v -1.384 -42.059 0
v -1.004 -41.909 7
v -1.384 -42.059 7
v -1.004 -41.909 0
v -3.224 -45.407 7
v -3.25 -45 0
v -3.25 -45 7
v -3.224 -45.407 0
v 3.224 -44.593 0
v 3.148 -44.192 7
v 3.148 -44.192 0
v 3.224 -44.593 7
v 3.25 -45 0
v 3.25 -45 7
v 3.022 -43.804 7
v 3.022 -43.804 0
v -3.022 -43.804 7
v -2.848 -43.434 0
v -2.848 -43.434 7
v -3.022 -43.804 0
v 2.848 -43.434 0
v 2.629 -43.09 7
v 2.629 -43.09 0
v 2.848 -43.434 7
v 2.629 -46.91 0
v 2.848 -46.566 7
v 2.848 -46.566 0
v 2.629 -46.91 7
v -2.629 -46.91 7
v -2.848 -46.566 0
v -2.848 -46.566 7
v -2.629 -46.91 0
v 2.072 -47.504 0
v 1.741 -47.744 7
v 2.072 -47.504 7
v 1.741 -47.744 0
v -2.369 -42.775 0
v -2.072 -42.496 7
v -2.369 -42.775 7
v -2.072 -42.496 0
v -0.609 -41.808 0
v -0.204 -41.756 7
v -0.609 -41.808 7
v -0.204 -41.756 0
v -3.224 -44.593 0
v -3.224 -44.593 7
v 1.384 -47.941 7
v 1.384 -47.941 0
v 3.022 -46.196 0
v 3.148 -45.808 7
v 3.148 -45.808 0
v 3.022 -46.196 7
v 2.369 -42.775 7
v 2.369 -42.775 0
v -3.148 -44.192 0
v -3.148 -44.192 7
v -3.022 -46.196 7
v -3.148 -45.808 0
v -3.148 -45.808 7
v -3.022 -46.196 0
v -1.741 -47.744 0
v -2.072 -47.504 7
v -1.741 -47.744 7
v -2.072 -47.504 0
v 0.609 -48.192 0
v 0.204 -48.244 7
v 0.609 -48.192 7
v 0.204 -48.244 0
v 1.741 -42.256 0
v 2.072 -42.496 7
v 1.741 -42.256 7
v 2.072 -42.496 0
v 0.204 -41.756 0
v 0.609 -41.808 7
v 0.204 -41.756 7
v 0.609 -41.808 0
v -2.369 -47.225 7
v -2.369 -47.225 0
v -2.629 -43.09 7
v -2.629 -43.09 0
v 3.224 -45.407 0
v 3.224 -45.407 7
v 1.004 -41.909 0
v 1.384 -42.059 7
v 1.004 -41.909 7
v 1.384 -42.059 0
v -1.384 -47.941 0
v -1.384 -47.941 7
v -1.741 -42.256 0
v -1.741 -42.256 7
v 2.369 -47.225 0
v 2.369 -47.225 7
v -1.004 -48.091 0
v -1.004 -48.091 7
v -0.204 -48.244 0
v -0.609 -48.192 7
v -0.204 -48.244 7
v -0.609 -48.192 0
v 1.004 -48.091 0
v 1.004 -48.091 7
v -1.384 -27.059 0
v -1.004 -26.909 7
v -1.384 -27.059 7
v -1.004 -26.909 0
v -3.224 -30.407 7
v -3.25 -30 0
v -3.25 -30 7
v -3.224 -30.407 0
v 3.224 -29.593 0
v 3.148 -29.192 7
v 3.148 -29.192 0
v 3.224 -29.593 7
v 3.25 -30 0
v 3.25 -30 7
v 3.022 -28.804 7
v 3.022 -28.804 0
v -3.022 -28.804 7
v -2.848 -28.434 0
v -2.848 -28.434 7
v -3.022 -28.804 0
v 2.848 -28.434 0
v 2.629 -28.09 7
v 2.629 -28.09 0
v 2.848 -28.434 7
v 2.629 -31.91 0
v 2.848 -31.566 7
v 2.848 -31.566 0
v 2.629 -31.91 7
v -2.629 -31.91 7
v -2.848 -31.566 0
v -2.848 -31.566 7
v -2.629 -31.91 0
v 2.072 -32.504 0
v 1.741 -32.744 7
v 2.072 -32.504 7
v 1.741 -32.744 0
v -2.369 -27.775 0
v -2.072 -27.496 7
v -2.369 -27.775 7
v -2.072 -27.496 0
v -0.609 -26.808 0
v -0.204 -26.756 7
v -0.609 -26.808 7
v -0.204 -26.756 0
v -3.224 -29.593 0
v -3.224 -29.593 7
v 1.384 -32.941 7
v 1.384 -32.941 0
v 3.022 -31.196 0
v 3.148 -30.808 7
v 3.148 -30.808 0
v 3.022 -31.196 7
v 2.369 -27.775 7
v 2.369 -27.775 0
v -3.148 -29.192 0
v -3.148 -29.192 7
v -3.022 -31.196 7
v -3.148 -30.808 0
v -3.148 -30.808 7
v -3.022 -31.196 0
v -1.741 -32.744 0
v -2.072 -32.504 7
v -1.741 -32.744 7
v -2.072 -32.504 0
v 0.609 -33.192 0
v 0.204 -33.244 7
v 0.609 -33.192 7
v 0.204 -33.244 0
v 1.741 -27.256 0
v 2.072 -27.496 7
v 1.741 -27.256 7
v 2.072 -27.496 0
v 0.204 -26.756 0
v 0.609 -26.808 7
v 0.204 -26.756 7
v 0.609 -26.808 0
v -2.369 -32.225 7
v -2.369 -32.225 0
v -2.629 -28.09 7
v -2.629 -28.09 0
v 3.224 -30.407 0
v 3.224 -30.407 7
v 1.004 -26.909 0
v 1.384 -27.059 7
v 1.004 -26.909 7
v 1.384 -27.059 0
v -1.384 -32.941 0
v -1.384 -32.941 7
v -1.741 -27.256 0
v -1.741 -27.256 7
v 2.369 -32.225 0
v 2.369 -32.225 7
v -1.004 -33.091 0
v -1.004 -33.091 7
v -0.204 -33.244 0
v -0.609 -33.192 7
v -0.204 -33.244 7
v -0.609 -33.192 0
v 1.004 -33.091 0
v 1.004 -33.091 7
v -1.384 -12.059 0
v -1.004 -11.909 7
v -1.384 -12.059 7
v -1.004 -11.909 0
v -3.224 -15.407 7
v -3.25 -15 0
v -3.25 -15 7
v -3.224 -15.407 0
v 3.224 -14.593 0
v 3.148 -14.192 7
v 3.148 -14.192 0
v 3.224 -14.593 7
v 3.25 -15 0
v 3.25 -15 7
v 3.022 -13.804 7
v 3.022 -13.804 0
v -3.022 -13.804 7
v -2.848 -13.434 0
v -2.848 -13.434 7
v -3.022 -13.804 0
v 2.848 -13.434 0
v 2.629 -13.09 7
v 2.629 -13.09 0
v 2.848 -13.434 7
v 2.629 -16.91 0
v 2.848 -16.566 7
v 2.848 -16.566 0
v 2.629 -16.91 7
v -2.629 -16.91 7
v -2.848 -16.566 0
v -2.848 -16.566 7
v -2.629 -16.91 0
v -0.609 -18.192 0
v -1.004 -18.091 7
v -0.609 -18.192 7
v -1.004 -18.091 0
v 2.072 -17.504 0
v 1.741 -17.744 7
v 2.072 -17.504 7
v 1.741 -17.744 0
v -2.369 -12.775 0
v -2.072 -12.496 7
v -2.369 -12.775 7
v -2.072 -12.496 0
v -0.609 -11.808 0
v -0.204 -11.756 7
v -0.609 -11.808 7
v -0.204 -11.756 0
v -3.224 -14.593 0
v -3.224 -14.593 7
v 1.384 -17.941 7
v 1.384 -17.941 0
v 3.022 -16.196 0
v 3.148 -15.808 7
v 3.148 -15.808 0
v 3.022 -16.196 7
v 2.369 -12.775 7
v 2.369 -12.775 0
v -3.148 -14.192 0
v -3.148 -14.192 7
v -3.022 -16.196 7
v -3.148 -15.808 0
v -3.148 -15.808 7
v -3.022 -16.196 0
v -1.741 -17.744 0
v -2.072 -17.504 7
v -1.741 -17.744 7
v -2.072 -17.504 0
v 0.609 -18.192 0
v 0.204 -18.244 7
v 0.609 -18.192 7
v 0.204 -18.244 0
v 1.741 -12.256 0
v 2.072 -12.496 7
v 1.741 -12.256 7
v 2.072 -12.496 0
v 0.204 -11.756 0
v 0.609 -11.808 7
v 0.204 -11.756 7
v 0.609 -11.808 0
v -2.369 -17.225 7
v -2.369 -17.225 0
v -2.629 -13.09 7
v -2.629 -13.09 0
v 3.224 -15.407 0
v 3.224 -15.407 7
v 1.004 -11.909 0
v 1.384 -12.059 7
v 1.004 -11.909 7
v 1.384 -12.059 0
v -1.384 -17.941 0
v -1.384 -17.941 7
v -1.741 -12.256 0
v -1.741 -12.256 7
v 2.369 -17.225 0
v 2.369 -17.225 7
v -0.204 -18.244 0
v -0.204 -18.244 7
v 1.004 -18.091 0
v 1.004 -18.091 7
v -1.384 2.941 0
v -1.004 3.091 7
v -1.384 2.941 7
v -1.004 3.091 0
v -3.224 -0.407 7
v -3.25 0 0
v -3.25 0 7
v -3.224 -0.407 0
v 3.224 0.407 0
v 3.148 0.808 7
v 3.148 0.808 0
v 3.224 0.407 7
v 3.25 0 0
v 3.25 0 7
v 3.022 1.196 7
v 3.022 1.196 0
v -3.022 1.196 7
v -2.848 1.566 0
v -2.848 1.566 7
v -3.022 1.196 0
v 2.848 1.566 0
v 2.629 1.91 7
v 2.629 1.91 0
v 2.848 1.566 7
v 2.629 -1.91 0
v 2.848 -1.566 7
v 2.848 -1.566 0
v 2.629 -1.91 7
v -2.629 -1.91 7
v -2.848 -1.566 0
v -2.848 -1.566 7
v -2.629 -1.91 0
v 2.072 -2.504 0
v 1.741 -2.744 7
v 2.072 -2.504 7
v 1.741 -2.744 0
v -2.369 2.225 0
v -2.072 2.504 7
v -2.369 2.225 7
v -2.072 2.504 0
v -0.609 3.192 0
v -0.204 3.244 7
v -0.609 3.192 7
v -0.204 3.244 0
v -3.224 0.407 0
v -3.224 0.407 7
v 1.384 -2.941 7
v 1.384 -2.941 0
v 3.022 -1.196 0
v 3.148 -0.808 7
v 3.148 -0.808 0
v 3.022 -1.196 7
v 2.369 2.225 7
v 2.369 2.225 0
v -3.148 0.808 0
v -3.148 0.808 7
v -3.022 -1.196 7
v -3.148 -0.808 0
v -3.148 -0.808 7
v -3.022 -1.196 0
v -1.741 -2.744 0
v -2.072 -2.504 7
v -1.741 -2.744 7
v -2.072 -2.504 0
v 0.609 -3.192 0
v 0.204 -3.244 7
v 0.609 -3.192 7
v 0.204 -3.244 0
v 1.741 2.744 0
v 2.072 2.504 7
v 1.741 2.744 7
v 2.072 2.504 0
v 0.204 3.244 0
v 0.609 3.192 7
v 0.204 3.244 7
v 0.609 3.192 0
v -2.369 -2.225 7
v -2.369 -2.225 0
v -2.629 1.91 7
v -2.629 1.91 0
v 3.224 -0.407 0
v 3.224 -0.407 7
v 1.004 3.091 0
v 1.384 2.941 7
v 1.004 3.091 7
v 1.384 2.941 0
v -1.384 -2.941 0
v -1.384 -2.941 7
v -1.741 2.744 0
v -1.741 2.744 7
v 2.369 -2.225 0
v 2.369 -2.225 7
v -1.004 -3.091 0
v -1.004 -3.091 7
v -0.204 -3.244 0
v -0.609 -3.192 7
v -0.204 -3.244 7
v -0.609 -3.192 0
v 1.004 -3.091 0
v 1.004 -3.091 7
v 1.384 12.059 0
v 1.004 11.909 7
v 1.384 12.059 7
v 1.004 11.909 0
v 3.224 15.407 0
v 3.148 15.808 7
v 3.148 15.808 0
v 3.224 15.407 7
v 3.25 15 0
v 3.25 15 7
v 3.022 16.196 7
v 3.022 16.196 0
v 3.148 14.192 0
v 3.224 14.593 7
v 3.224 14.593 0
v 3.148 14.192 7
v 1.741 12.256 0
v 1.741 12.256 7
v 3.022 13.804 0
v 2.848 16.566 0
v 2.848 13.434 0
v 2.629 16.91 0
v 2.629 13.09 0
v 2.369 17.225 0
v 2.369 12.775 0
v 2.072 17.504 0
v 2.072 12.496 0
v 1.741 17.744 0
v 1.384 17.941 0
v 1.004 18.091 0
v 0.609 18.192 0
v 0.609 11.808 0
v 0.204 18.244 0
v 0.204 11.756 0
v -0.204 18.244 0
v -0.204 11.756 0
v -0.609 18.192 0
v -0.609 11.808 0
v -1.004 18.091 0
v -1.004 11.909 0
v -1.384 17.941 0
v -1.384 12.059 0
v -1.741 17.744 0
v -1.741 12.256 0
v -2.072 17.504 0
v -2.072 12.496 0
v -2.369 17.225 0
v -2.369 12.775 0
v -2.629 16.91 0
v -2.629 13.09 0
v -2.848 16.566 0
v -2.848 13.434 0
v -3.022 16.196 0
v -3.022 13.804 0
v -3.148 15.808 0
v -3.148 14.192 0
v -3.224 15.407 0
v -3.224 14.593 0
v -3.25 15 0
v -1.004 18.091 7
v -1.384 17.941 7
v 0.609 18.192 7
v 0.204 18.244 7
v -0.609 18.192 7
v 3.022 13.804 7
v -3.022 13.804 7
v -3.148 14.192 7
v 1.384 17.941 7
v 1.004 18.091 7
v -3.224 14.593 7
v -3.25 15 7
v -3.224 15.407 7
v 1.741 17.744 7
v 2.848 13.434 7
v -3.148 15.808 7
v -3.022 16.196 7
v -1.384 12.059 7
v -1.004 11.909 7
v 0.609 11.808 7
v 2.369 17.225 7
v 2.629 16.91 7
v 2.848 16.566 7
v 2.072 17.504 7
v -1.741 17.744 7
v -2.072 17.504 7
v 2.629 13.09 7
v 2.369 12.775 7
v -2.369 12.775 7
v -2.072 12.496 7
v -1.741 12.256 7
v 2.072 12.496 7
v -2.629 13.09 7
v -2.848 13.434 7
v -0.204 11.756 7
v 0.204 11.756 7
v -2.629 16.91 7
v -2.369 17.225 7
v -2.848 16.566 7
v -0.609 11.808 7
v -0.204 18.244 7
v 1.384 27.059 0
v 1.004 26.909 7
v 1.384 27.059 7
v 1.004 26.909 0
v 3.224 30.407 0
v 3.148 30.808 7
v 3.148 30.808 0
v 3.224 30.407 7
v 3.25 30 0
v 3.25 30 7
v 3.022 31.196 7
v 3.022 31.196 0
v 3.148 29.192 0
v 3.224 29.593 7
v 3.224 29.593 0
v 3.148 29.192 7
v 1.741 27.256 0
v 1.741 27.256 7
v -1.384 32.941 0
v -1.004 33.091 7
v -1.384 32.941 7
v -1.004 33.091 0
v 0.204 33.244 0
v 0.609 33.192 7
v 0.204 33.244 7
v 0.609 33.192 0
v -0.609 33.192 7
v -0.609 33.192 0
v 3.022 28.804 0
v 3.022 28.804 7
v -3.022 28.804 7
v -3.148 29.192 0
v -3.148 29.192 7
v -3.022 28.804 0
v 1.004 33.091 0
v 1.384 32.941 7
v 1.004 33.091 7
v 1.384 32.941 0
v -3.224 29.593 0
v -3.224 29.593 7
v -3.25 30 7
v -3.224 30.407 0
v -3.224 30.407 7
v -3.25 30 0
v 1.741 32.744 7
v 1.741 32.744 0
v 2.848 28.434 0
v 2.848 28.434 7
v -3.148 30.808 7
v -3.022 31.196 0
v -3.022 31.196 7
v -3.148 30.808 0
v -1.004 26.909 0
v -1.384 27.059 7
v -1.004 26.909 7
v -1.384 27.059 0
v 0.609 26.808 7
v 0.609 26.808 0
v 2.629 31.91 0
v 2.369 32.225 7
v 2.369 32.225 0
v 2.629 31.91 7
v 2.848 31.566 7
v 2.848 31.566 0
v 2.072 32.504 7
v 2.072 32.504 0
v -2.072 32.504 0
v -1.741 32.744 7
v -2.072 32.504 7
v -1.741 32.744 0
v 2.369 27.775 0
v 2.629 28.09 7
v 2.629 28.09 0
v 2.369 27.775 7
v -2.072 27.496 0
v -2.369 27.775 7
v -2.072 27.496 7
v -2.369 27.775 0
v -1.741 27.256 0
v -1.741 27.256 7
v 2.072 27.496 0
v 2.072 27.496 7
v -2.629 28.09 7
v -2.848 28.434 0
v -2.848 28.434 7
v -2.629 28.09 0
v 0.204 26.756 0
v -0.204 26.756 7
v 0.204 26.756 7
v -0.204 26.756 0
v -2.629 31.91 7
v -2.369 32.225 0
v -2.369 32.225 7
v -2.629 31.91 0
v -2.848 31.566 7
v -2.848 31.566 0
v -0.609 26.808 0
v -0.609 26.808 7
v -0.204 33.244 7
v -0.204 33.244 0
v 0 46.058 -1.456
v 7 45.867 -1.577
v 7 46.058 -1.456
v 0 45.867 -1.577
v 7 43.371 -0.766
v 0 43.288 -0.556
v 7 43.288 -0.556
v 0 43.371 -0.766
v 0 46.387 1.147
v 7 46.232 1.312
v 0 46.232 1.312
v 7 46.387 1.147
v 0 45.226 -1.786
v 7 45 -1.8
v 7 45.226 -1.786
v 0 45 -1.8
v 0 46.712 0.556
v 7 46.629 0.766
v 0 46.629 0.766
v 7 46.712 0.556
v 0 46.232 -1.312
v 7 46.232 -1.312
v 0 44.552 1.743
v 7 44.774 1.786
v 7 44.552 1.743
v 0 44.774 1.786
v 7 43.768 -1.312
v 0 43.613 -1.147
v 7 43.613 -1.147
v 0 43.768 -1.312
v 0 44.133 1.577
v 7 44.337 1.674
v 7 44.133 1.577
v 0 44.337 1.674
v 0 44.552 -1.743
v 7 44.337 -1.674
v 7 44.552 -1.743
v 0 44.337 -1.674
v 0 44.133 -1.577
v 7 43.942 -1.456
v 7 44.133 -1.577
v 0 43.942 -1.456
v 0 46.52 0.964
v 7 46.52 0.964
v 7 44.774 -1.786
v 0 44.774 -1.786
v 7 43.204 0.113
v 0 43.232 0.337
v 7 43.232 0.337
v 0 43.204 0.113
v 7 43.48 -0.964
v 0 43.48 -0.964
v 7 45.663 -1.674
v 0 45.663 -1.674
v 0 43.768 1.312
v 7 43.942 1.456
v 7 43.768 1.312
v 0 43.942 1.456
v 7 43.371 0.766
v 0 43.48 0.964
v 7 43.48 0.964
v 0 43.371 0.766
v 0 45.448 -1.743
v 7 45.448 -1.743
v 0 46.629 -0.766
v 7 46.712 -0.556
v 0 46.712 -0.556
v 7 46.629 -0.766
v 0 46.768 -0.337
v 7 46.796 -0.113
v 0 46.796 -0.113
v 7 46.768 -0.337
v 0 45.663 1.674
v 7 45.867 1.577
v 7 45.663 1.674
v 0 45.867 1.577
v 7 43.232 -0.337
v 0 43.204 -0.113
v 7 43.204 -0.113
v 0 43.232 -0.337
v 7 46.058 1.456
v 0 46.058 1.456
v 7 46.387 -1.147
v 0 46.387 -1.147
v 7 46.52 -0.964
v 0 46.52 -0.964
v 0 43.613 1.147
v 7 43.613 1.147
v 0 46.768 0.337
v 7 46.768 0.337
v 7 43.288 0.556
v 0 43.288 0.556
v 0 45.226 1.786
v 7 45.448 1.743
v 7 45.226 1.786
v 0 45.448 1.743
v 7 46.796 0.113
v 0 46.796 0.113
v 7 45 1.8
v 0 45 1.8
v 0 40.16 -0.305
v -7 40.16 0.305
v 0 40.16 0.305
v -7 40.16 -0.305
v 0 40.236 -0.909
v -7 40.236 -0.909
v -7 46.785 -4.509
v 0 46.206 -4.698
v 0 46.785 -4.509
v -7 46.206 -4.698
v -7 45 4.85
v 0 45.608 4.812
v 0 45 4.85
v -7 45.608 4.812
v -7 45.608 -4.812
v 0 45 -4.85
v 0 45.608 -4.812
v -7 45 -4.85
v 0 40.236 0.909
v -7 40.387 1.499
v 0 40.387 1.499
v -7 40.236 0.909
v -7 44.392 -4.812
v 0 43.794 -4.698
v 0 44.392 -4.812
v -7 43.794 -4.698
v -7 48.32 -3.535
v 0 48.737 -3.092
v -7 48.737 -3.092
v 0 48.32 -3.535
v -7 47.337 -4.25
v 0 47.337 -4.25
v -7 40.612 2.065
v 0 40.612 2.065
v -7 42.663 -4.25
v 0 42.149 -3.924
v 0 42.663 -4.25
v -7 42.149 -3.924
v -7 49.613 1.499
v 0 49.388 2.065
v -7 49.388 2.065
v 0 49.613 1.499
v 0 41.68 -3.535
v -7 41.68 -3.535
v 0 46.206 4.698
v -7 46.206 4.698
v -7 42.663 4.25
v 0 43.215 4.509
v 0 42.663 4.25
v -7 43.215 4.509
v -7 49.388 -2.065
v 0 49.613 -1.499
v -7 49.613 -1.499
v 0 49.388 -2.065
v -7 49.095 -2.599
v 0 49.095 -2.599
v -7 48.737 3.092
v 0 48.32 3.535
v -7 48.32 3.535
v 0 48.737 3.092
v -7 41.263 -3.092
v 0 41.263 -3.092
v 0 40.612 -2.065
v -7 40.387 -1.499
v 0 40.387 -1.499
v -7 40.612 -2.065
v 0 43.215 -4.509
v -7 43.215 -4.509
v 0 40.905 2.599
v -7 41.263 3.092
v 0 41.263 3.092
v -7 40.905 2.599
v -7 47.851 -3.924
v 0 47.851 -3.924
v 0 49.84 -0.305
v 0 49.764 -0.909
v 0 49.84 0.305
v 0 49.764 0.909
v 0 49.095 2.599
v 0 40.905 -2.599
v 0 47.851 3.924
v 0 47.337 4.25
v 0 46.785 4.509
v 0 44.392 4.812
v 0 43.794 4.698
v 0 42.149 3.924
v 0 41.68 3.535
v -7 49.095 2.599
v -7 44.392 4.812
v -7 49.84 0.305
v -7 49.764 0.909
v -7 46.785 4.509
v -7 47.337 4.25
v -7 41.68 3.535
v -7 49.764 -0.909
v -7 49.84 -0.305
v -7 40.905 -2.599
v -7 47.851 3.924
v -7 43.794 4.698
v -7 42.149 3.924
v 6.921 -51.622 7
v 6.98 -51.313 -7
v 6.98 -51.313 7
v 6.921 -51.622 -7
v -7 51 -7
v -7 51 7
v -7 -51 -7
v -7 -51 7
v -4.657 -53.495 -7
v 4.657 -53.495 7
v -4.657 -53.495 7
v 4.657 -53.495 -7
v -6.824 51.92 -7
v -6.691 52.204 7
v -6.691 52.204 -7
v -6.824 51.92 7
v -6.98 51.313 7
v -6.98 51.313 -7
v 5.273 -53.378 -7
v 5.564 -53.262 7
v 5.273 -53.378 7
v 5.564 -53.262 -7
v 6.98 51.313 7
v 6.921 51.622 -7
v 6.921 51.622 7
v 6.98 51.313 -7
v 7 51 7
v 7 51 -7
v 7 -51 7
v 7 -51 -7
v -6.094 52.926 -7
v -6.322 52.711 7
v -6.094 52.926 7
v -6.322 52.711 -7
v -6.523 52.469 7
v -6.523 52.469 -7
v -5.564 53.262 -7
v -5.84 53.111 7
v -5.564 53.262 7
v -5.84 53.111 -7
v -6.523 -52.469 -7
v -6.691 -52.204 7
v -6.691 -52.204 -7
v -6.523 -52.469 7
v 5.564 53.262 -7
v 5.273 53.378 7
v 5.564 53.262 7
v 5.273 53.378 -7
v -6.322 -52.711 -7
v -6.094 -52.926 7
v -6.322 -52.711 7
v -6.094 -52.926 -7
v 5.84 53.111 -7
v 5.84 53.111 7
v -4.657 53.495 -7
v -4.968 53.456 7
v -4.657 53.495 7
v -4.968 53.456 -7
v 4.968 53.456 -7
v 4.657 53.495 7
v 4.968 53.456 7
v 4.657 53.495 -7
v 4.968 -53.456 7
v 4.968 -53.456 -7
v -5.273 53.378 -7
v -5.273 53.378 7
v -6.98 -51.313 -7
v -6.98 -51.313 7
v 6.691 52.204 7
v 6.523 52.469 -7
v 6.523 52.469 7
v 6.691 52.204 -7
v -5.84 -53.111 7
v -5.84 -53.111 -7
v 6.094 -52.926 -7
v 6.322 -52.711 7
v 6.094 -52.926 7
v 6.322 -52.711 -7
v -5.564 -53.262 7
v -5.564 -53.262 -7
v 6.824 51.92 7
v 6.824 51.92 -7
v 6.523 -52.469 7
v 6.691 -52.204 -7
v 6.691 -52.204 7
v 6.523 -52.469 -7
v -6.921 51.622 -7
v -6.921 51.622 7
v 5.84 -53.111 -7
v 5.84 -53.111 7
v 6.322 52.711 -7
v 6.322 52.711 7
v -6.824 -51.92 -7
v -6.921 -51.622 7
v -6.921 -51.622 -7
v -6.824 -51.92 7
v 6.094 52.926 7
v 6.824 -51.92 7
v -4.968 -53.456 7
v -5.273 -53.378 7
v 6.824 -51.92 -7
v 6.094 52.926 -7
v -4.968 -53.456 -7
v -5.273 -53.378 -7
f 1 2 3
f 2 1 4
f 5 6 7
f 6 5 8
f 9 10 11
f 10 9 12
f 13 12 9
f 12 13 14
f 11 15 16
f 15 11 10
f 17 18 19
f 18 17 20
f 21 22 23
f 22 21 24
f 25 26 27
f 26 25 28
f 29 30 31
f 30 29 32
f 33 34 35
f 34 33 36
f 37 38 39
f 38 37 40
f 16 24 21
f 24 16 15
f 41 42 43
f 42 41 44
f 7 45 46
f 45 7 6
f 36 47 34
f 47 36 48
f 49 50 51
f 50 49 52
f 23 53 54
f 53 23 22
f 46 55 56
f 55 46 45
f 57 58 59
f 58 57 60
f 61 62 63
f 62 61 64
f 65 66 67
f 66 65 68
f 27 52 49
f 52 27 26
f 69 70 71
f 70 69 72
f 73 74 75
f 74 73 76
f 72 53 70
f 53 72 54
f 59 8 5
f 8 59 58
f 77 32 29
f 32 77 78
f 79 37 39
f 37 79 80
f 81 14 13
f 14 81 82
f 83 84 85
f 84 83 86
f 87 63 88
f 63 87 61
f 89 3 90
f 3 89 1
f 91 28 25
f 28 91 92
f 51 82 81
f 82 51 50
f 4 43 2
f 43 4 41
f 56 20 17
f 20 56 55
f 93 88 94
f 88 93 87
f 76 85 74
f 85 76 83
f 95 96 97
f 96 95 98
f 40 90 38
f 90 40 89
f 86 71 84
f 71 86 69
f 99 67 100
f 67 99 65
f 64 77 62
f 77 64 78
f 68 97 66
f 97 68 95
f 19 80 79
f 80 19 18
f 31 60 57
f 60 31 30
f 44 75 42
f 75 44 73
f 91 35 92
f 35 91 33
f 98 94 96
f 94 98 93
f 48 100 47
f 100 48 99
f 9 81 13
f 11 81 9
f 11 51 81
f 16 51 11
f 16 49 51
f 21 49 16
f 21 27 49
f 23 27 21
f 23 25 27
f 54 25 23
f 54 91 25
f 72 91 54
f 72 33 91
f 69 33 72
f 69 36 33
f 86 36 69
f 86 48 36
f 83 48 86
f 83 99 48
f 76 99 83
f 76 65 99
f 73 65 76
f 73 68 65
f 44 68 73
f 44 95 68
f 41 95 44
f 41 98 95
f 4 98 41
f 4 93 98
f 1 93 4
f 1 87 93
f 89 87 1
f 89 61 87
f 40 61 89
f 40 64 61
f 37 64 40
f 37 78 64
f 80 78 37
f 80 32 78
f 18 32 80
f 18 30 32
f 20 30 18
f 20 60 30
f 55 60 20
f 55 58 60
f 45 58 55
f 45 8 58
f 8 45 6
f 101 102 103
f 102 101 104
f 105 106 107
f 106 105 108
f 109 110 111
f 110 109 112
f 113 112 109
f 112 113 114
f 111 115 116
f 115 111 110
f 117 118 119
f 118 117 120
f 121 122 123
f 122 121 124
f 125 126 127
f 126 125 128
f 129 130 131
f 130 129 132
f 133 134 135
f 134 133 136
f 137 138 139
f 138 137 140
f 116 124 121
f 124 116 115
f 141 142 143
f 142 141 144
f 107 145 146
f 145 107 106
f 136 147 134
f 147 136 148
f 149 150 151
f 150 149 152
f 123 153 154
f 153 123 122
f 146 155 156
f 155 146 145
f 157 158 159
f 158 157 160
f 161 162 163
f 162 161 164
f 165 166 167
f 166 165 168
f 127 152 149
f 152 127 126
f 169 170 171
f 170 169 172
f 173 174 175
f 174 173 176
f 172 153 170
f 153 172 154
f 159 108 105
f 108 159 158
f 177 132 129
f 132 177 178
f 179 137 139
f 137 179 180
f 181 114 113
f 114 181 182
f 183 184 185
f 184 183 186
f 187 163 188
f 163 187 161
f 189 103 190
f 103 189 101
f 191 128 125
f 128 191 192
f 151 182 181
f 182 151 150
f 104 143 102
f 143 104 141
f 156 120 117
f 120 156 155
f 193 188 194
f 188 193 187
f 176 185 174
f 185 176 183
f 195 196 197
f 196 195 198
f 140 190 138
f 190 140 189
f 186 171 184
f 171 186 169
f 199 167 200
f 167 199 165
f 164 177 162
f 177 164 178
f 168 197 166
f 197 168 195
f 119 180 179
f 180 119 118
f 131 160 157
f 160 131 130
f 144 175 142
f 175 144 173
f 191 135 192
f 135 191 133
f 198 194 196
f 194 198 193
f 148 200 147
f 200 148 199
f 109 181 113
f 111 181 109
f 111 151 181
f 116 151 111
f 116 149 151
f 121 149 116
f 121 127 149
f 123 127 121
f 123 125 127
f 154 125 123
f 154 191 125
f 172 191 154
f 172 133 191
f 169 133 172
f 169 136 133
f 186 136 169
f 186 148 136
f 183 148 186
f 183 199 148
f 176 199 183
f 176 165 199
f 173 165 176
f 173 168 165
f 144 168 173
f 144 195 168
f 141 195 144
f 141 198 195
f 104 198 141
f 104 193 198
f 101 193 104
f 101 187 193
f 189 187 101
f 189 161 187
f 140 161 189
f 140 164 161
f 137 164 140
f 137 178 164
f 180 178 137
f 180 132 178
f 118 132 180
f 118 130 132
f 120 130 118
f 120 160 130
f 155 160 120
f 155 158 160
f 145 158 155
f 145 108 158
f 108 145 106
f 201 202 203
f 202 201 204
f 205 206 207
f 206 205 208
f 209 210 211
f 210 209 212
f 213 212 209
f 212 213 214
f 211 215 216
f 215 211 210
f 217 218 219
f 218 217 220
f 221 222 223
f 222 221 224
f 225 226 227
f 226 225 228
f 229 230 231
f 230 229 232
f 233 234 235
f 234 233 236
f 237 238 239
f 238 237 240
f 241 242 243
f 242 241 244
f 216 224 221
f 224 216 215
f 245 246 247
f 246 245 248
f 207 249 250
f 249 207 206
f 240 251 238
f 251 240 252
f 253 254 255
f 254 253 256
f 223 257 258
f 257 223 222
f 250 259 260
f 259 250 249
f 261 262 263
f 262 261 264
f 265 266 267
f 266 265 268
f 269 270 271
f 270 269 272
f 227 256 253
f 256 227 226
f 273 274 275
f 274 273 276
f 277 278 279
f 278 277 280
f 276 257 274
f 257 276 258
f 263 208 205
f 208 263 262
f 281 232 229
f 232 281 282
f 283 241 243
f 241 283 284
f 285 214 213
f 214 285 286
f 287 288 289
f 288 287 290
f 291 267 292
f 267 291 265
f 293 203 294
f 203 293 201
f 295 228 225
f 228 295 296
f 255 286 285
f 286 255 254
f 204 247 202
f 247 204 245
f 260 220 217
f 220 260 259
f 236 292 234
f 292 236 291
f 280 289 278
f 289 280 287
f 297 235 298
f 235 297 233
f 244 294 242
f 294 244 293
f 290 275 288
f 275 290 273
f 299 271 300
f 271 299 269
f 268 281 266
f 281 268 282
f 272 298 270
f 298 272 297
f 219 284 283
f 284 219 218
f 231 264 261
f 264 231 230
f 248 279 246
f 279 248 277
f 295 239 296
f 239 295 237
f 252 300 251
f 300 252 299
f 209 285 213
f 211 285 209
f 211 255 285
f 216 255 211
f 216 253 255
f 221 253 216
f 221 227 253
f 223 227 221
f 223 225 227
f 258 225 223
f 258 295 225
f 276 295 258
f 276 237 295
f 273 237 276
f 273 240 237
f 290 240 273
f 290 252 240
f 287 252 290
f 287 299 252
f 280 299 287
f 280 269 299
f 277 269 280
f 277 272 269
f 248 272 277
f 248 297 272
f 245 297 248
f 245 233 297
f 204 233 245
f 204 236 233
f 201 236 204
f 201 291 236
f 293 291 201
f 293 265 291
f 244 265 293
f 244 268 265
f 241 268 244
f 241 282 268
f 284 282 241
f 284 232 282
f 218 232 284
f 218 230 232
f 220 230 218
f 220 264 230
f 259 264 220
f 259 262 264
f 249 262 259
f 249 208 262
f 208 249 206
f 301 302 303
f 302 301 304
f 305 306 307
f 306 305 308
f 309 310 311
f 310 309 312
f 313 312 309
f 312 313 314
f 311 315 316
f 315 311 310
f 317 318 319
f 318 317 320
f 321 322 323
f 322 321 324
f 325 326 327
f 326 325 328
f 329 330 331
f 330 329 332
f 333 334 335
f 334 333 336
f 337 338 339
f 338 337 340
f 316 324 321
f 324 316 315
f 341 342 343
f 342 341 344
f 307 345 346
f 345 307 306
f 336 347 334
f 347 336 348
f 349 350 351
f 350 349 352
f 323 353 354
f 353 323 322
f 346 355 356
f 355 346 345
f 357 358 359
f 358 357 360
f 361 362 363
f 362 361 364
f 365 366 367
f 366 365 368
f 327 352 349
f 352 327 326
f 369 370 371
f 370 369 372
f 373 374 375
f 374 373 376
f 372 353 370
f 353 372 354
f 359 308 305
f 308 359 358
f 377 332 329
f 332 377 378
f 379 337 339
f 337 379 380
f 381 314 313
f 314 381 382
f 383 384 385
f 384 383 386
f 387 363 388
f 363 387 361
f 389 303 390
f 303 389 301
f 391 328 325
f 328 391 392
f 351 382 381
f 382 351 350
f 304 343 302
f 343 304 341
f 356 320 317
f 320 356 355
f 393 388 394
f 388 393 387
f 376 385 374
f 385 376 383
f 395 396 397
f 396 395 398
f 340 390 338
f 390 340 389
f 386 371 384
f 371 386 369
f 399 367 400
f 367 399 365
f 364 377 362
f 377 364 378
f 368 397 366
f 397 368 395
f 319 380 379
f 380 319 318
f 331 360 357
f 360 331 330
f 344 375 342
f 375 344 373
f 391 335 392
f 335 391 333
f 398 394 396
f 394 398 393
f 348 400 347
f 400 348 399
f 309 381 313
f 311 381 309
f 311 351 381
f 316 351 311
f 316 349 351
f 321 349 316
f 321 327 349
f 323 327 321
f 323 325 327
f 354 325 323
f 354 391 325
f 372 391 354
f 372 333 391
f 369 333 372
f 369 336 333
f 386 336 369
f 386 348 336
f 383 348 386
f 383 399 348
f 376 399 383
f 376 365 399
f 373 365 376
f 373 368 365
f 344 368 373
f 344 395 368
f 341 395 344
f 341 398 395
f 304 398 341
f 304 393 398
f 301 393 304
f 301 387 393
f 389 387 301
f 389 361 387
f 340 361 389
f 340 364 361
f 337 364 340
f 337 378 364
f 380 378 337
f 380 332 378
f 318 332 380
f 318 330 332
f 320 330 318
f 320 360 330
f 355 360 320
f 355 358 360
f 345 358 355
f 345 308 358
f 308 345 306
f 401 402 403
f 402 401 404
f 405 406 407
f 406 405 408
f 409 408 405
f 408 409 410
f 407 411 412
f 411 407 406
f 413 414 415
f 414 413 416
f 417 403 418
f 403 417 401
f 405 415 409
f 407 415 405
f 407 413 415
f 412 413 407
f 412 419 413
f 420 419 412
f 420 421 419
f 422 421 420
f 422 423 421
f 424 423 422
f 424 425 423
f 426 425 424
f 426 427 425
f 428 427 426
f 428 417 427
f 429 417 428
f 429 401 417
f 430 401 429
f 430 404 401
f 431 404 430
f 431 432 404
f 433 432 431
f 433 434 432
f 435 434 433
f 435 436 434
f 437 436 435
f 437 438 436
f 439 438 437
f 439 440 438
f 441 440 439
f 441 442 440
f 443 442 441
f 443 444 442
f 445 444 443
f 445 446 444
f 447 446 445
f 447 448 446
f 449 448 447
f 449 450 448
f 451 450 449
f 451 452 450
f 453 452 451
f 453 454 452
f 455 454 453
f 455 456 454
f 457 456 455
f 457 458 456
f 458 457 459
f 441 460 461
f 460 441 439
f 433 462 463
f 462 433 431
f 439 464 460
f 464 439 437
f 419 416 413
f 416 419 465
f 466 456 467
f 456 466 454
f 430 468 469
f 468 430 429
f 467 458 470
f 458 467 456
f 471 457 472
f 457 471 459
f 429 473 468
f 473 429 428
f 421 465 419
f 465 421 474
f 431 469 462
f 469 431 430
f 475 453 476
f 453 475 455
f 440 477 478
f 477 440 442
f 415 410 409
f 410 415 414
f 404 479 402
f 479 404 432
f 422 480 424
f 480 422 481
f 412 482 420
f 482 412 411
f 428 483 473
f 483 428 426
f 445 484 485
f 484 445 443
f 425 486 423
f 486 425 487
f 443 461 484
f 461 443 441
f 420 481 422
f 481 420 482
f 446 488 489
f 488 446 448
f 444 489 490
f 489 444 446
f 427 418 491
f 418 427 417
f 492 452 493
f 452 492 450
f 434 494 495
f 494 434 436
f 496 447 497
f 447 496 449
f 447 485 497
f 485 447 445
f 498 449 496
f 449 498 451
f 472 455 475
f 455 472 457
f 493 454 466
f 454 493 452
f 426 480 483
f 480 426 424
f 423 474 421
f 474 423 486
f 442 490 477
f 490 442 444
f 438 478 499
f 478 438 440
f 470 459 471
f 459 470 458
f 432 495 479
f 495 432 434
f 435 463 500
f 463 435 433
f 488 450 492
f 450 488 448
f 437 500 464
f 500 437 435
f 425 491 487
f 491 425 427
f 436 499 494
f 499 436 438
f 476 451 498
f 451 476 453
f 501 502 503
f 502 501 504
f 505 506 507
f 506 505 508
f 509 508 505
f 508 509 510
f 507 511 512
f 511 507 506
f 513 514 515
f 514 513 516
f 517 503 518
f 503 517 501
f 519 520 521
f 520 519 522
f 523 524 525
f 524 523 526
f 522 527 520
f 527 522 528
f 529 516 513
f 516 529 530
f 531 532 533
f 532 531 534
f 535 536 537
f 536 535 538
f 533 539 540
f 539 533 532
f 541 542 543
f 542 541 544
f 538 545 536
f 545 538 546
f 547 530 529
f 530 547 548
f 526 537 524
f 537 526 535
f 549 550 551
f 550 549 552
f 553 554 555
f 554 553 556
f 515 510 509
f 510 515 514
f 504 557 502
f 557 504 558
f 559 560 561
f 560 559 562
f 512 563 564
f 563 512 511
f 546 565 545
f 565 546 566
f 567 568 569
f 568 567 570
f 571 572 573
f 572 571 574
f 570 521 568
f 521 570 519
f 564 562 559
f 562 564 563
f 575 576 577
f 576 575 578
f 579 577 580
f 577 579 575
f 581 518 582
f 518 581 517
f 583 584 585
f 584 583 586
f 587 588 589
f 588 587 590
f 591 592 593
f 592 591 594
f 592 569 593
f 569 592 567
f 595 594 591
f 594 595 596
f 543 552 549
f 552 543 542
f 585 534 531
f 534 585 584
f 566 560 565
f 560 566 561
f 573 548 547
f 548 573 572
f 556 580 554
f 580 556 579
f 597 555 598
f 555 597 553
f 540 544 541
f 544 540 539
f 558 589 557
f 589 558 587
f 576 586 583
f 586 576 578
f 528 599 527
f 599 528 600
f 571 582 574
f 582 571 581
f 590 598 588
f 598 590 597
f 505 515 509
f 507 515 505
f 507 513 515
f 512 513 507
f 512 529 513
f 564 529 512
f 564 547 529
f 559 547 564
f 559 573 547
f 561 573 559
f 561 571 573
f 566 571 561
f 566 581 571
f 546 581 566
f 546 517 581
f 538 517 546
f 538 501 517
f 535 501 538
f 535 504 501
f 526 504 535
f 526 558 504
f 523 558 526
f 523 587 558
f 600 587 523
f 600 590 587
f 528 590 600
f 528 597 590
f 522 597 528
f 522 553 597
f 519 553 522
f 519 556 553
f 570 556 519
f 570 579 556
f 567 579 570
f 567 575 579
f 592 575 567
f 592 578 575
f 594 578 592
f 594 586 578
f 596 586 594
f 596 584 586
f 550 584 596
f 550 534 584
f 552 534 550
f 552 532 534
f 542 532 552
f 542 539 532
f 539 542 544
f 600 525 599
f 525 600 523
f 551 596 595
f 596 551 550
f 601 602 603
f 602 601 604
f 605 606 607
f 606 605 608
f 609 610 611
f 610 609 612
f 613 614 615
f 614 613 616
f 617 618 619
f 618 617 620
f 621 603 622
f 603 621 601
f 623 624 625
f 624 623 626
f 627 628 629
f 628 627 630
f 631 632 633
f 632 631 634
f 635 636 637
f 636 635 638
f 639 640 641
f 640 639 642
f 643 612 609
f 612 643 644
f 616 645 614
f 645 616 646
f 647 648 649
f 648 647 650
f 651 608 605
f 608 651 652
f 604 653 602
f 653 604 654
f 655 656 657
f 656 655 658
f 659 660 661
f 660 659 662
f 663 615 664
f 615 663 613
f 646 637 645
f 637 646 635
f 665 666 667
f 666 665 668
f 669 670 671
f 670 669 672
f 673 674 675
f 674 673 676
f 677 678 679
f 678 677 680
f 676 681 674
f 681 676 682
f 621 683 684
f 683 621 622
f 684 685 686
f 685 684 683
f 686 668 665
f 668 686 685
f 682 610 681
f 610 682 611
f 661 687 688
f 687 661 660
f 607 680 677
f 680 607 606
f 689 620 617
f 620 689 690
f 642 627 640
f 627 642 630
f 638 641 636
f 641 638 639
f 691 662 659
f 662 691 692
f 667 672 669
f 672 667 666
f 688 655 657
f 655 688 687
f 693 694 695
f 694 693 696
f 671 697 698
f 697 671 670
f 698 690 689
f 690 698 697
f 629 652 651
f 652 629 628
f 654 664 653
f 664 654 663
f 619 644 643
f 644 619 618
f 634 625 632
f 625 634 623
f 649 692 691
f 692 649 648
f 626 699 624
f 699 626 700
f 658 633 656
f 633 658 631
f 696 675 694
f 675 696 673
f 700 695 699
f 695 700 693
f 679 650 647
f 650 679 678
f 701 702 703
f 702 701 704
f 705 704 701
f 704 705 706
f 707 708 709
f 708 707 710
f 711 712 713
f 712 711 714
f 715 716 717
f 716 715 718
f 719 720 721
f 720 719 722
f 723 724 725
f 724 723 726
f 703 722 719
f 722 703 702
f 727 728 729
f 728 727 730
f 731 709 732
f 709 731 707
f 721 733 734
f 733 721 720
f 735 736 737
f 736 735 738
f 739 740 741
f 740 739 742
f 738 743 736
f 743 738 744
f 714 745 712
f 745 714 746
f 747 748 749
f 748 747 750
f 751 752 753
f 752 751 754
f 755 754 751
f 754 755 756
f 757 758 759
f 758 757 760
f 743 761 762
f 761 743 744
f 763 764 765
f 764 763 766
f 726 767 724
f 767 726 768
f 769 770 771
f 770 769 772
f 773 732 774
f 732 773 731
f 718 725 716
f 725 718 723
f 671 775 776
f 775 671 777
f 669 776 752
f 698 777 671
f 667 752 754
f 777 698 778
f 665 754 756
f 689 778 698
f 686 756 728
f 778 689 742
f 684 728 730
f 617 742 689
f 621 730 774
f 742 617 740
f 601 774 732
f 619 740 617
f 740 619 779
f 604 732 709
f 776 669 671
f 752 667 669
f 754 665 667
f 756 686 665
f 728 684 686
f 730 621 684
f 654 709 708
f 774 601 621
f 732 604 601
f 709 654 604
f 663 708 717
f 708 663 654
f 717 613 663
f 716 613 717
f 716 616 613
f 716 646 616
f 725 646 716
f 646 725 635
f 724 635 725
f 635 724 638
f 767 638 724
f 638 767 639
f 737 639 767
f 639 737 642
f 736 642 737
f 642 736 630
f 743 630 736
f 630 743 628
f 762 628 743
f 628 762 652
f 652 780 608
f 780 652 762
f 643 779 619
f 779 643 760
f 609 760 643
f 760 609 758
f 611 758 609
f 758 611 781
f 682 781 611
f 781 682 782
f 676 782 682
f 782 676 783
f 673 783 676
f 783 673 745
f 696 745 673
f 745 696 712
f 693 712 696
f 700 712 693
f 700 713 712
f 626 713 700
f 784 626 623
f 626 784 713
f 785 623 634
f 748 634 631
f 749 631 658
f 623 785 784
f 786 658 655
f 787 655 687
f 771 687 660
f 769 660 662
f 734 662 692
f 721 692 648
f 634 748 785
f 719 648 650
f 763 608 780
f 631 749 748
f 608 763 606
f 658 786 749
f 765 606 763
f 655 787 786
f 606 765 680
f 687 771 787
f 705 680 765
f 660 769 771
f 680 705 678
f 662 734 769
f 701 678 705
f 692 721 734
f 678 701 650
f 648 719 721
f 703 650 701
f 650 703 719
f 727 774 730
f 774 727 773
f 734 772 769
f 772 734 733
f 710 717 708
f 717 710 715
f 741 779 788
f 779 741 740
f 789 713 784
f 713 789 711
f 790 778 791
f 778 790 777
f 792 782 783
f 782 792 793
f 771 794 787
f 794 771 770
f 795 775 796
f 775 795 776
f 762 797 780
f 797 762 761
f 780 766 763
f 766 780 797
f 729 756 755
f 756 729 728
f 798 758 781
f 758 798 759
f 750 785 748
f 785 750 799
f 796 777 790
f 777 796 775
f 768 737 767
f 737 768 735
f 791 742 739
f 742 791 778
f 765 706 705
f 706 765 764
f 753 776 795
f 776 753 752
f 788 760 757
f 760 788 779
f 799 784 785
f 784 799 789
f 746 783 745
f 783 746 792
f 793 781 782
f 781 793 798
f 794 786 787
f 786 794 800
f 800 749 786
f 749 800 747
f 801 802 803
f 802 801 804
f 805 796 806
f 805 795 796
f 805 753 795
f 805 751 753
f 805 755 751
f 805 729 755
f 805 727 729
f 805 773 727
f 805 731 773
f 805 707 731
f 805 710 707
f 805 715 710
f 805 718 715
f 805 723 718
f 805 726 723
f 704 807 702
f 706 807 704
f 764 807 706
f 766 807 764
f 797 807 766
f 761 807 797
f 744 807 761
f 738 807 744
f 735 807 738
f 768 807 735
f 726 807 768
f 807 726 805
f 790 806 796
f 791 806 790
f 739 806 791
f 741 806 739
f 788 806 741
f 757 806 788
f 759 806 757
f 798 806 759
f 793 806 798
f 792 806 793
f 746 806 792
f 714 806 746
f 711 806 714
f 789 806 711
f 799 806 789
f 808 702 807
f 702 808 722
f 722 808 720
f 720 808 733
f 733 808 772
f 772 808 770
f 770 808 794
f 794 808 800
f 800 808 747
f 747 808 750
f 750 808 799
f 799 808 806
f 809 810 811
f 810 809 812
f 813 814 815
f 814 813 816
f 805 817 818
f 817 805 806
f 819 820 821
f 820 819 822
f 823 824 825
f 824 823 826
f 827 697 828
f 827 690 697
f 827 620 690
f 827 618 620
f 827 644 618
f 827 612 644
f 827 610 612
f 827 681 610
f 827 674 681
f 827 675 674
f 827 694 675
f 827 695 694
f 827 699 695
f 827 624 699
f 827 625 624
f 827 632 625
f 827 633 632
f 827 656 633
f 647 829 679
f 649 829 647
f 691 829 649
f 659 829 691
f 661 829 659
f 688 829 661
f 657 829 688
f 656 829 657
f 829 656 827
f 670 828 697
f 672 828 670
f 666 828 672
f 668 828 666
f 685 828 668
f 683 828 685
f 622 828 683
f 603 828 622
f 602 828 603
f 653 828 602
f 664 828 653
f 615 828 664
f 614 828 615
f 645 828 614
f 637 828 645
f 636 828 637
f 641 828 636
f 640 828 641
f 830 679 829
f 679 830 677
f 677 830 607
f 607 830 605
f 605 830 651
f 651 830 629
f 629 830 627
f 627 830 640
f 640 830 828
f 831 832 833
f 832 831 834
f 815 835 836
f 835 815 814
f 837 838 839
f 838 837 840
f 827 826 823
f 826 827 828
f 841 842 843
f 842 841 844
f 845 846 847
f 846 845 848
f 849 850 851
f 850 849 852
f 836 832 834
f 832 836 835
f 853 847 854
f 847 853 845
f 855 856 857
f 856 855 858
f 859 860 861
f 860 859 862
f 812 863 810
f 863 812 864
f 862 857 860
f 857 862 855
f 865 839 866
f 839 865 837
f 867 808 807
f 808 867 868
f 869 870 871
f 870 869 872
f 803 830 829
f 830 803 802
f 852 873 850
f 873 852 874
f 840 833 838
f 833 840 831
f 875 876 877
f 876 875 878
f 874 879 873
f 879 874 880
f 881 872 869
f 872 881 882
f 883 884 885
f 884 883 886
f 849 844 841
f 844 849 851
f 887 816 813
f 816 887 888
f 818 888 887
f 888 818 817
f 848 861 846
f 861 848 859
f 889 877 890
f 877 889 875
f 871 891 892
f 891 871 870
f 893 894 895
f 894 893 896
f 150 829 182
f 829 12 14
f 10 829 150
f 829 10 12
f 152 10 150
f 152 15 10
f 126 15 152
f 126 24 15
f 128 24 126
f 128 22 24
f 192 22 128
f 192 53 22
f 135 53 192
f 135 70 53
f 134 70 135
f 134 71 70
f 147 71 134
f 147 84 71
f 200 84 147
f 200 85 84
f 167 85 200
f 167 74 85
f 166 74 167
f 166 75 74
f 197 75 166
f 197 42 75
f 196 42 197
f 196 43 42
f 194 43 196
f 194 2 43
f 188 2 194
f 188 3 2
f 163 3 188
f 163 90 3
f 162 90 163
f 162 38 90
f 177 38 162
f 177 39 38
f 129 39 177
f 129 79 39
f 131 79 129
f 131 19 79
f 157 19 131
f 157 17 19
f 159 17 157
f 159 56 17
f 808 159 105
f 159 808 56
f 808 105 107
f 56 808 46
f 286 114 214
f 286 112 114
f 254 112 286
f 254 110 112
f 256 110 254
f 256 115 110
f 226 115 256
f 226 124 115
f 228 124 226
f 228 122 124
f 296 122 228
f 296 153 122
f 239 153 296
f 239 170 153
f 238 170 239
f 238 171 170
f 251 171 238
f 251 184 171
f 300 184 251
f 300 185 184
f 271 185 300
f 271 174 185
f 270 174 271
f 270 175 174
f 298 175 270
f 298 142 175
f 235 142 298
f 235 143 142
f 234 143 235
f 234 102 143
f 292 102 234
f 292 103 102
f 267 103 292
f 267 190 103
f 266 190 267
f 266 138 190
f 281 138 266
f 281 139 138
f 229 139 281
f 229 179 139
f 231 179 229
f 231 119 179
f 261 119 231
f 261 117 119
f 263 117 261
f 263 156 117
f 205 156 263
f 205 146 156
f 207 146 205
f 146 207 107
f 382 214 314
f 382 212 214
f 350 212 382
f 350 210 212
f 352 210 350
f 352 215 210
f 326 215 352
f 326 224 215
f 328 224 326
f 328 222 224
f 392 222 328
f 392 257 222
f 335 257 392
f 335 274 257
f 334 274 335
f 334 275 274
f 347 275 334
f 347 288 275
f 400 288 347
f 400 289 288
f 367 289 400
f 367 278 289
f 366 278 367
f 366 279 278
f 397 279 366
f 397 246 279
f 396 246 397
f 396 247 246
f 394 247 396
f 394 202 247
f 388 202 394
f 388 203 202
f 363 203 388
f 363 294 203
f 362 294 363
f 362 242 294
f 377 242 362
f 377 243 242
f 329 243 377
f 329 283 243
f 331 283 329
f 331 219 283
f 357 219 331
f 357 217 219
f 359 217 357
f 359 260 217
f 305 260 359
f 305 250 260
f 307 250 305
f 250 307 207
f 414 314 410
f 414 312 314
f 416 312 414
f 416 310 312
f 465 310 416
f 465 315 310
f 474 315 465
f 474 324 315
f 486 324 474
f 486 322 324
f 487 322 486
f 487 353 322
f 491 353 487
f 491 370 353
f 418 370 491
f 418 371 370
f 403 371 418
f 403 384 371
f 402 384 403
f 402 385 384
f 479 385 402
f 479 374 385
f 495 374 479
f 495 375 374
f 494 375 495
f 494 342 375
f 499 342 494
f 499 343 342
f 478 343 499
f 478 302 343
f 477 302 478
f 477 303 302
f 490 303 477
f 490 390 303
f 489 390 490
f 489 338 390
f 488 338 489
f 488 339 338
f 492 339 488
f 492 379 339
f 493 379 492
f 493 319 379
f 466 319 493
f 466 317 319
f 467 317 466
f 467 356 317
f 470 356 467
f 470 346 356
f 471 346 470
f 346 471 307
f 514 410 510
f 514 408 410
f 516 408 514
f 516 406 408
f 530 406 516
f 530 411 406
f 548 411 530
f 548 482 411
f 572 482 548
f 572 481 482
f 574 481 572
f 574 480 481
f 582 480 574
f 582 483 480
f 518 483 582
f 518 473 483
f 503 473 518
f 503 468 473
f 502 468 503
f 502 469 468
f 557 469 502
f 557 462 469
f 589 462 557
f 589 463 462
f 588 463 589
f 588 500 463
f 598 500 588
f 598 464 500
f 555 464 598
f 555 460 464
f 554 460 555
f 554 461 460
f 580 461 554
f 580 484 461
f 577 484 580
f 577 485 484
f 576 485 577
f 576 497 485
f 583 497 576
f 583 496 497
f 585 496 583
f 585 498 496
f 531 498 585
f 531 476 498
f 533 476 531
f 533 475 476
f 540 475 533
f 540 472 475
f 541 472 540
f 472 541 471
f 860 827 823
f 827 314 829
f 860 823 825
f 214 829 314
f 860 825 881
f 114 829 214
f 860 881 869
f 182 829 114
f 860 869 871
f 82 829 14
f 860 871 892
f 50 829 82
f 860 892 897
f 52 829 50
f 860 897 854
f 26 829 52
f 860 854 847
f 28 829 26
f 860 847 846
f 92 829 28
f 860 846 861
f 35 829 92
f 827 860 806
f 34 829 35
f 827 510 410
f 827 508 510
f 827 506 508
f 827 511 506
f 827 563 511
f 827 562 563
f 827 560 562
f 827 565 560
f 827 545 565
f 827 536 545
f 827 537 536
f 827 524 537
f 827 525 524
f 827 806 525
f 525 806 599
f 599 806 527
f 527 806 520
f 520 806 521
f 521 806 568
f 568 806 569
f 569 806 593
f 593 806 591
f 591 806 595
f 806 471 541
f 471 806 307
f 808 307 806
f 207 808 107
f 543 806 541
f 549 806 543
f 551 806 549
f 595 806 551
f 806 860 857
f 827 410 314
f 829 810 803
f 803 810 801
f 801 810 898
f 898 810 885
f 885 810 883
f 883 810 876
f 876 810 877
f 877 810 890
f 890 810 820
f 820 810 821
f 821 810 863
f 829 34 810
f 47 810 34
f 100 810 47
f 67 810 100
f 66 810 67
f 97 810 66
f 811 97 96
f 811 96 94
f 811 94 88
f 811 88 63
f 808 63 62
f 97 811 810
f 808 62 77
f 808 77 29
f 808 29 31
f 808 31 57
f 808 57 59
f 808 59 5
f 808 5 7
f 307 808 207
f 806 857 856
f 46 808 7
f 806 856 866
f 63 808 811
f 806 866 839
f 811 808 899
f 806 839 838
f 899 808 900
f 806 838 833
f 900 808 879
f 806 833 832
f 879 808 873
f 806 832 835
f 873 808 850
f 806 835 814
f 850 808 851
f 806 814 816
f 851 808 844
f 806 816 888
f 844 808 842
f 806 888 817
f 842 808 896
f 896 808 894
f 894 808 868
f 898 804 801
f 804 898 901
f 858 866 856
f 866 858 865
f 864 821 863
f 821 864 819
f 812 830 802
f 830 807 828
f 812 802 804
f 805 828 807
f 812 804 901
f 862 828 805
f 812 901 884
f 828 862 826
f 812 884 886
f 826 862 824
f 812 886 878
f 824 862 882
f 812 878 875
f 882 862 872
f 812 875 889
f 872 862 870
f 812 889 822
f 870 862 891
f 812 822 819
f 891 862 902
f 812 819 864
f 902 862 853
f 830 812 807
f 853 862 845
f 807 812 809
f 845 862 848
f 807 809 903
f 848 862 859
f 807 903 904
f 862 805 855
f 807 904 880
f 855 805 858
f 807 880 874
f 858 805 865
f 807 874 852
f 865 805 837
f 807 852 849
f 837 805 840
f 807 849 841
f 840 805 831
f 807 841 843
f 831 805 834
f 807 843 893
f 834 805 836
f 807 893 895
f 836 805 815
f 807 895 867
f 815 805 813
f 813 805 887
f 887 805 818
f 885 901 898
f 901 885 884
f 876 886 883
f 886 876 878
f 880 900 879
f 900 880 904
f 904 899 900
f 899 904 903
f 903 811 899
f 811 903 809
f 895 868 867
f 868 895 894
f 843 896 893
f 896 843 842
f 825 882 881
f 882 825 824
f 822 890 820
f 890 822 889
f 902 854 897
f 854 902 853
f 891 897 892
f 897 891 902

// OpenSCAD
$fn = 50;


difference() {
	union() {
		translate(v = [0, 0, -7.0000000000]) {
			hull() {
				translate(v = [-4.5000000000, 51.0000000000, 0]) {
					cylinder(h = 14, r = 2.5000000000);
				}
				translate(v = [4.5000000000, 51.0000000000, 0]) {
					cylinder(h = 14, r = 2.5000000000);
				}
				translate(v = [-4.5000000000, -51.0000000000, 0]) {
					cylinder(h = 14, r = 2.5000000000);
				}
				translate(v = [4.5000000000, -51.0000000000, 0]) {
					cylinder(h = 14, r = 2.5000000000);
				}
			}
		}
	}
	union() {
		translate(v = [0.0000000000, -45.0000000000, 0]) {
			cylinder(h = 100, r = 3.2500000000);
		}
		translate(v = [0.0000000000, -30.0000000000, 0]) {
			cylinder(h = 100, r = 3.2500000000);
		}
		translate(v = [0.0000000000, -15.0000000000, 0]) {
			cylinder(h = 100, r = 3.2500000000);
		}
		cylinder(h = 100, r = 3.2500000000);
		translate(v = [0.0000000000, 15.0000000000, 0]) {
			cylinder(h = 100, r = 3.2500000000);
		}
		translate(v = [0.0000000000, 30.0000000000, 0]) {
			cylinder(h = 100, r = 3.2500000000);
		}
		translate(v = [-50, 45, 0]) {
			rotate(a = [0, 90, 0]) {
				cylinder(h = 100, r = 1.8000000000);
			}
		}
		translate(v = [-100, 45, 0]) {
			rotate(a = [0, 90, 0]) {
				cylinder(h = 100, r = 4.8500000000);
			}
		}
	}
}
